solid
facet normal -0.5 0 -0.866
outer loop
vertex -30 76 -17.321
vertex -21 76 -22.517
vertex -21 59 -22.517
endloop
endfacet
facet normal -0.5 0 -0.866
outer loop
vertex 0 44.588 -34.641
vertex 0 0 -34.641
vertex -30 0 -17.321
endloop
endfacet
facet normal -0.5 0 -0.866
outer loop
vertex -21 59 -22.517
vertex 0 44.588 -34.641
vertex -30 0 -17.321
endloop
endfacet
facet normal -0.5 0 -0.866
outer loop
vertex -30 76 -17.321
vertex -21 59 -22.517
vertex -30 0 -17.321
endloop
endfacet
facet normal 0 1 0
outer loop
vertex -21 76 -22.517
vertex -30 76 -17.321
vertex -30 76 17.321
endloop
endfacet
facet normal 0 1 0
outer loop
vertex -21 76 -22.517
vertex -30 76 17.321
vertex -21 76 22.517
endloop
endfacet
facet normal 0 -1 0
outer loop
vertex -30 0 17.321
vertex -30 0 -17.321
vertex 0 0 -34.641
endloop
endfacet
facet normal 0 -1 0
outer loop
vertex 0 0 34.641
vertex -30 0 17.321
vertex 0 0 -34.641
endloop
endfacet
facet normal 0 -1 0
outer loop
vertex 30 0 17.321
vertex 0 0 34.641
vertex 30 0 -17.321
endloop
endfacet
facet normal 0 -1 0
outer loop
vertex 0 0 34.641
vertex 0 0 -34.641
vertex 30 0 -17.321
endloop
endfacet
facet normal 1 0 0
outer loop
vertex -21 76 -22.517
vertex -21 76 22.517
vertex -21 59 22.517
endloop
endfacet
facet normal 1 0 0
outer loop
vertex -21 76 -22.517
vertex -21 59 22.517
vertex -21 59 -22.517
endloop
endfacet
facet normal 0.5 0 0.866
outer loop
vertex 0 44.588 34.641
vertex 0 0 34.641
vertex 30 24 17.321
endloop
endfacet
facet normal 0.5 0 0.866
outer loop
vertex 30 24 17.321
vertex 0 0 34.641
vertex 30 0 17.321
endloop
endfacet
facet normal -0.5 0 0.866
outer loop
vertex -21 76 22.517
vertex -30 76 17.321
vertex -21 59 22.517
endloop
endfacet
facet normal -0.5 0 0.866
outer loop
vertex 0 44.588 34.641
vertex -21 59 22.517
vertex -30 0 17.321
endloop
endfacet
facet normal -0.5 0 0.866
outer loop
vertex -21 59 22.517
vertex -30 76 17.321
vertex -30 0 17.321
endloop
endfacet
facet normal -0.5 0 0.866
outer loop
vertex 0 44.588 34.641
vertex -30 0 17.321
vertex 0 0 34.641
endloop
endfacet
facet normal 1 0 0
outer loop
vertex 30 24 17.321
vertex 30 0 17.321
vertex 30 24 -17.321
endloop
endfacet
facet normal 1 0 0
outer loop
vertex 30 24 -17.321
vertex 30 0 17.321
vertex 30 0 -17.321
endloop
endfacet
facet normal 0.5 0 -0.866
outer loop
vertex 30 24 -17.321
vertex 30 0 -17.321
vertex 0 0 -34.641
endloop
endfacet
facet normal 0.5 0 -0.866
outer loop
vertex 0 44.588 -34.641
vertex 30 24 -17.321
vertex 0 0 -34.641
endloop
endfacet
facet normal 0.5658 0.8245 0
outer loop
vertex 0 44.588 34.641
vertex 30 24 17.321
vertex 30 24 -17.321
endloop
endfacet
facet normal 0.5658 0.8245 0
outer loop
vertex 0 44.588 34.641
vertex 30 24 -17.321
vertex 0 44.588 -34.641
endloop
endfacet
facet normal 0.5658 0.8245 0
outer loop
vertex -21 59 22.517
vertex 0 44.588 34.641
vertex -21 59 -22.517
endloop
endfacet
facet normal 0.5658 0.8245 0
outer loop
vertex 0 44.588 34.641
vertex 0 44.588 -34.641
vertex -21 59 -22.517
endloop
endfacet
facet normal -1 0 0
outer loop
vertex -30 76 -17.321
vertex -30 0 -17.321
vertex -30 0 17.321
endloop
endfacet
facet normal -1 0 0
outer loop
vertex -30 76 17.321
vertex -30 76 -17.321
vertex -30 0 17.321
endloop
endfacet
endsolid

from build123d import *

# Parameters (mm, degrees)
EXTRUDE_2_DEPTH     = 76
SKETCH_5_W          = 69.282032302
SKETCH_5_H          = 17
CUT_EXTRUDE_2_DEPTH = 51
SKETCH_7_W          = 79.816599869
SKETCH_7_H          = 73.41094556
CUT_EXTRUDE_3_DEPTH = 51


with BuildPart() as part:
    # 草图1 → 凸台-拉伸2 (new body)
    with BuildSketch(Plane(origin=(0, 0, 0), x_dir=(1, 0, 0), z_dir=(0, 1, 0))):
        Polygon((0, 34.641016151), (-30, 17.320508076), (-30, -17.320508076), (0, -34.641016151), (30, -17.320508076), (30, 17.320508076), align=None)
    extrude(amount=EXTRUDE_2_DEPTH)

    # 草图5 → 切除-拉伸2 (cut)
    with BuildSketch(Plane(origin=(30, 0, 0), x_dir=(0, 0, -1), z_dir=(1, 0, 0))):
        with Locations((0, 67.5)):
            Rectangle(SKETCH_5_W, SKETCH_5_H)
    extrude(amount=-CUT_EXTRUDE_2_DEPTH, mode=Mode.SUBTRACT)

    # 草图7 → 切除-拉伸3 (cut)
    with BuildSketch(Plane(origin=(20.8024046, 30.312075274, 0), x_dir=(-0.824513353, 0.565842497, 0), z_dir=(-0.565842497, -0.824513353, 0))):
        with Locations((10.791187789, -0.103687776)):
            Rectangle(SKETCH_7_W, SKETCH_7_H)
    extrude(amount=-CUT_EXTRUDE_3_DEPTH, mode=Mode.SUBTRACT)


solid = part.part
